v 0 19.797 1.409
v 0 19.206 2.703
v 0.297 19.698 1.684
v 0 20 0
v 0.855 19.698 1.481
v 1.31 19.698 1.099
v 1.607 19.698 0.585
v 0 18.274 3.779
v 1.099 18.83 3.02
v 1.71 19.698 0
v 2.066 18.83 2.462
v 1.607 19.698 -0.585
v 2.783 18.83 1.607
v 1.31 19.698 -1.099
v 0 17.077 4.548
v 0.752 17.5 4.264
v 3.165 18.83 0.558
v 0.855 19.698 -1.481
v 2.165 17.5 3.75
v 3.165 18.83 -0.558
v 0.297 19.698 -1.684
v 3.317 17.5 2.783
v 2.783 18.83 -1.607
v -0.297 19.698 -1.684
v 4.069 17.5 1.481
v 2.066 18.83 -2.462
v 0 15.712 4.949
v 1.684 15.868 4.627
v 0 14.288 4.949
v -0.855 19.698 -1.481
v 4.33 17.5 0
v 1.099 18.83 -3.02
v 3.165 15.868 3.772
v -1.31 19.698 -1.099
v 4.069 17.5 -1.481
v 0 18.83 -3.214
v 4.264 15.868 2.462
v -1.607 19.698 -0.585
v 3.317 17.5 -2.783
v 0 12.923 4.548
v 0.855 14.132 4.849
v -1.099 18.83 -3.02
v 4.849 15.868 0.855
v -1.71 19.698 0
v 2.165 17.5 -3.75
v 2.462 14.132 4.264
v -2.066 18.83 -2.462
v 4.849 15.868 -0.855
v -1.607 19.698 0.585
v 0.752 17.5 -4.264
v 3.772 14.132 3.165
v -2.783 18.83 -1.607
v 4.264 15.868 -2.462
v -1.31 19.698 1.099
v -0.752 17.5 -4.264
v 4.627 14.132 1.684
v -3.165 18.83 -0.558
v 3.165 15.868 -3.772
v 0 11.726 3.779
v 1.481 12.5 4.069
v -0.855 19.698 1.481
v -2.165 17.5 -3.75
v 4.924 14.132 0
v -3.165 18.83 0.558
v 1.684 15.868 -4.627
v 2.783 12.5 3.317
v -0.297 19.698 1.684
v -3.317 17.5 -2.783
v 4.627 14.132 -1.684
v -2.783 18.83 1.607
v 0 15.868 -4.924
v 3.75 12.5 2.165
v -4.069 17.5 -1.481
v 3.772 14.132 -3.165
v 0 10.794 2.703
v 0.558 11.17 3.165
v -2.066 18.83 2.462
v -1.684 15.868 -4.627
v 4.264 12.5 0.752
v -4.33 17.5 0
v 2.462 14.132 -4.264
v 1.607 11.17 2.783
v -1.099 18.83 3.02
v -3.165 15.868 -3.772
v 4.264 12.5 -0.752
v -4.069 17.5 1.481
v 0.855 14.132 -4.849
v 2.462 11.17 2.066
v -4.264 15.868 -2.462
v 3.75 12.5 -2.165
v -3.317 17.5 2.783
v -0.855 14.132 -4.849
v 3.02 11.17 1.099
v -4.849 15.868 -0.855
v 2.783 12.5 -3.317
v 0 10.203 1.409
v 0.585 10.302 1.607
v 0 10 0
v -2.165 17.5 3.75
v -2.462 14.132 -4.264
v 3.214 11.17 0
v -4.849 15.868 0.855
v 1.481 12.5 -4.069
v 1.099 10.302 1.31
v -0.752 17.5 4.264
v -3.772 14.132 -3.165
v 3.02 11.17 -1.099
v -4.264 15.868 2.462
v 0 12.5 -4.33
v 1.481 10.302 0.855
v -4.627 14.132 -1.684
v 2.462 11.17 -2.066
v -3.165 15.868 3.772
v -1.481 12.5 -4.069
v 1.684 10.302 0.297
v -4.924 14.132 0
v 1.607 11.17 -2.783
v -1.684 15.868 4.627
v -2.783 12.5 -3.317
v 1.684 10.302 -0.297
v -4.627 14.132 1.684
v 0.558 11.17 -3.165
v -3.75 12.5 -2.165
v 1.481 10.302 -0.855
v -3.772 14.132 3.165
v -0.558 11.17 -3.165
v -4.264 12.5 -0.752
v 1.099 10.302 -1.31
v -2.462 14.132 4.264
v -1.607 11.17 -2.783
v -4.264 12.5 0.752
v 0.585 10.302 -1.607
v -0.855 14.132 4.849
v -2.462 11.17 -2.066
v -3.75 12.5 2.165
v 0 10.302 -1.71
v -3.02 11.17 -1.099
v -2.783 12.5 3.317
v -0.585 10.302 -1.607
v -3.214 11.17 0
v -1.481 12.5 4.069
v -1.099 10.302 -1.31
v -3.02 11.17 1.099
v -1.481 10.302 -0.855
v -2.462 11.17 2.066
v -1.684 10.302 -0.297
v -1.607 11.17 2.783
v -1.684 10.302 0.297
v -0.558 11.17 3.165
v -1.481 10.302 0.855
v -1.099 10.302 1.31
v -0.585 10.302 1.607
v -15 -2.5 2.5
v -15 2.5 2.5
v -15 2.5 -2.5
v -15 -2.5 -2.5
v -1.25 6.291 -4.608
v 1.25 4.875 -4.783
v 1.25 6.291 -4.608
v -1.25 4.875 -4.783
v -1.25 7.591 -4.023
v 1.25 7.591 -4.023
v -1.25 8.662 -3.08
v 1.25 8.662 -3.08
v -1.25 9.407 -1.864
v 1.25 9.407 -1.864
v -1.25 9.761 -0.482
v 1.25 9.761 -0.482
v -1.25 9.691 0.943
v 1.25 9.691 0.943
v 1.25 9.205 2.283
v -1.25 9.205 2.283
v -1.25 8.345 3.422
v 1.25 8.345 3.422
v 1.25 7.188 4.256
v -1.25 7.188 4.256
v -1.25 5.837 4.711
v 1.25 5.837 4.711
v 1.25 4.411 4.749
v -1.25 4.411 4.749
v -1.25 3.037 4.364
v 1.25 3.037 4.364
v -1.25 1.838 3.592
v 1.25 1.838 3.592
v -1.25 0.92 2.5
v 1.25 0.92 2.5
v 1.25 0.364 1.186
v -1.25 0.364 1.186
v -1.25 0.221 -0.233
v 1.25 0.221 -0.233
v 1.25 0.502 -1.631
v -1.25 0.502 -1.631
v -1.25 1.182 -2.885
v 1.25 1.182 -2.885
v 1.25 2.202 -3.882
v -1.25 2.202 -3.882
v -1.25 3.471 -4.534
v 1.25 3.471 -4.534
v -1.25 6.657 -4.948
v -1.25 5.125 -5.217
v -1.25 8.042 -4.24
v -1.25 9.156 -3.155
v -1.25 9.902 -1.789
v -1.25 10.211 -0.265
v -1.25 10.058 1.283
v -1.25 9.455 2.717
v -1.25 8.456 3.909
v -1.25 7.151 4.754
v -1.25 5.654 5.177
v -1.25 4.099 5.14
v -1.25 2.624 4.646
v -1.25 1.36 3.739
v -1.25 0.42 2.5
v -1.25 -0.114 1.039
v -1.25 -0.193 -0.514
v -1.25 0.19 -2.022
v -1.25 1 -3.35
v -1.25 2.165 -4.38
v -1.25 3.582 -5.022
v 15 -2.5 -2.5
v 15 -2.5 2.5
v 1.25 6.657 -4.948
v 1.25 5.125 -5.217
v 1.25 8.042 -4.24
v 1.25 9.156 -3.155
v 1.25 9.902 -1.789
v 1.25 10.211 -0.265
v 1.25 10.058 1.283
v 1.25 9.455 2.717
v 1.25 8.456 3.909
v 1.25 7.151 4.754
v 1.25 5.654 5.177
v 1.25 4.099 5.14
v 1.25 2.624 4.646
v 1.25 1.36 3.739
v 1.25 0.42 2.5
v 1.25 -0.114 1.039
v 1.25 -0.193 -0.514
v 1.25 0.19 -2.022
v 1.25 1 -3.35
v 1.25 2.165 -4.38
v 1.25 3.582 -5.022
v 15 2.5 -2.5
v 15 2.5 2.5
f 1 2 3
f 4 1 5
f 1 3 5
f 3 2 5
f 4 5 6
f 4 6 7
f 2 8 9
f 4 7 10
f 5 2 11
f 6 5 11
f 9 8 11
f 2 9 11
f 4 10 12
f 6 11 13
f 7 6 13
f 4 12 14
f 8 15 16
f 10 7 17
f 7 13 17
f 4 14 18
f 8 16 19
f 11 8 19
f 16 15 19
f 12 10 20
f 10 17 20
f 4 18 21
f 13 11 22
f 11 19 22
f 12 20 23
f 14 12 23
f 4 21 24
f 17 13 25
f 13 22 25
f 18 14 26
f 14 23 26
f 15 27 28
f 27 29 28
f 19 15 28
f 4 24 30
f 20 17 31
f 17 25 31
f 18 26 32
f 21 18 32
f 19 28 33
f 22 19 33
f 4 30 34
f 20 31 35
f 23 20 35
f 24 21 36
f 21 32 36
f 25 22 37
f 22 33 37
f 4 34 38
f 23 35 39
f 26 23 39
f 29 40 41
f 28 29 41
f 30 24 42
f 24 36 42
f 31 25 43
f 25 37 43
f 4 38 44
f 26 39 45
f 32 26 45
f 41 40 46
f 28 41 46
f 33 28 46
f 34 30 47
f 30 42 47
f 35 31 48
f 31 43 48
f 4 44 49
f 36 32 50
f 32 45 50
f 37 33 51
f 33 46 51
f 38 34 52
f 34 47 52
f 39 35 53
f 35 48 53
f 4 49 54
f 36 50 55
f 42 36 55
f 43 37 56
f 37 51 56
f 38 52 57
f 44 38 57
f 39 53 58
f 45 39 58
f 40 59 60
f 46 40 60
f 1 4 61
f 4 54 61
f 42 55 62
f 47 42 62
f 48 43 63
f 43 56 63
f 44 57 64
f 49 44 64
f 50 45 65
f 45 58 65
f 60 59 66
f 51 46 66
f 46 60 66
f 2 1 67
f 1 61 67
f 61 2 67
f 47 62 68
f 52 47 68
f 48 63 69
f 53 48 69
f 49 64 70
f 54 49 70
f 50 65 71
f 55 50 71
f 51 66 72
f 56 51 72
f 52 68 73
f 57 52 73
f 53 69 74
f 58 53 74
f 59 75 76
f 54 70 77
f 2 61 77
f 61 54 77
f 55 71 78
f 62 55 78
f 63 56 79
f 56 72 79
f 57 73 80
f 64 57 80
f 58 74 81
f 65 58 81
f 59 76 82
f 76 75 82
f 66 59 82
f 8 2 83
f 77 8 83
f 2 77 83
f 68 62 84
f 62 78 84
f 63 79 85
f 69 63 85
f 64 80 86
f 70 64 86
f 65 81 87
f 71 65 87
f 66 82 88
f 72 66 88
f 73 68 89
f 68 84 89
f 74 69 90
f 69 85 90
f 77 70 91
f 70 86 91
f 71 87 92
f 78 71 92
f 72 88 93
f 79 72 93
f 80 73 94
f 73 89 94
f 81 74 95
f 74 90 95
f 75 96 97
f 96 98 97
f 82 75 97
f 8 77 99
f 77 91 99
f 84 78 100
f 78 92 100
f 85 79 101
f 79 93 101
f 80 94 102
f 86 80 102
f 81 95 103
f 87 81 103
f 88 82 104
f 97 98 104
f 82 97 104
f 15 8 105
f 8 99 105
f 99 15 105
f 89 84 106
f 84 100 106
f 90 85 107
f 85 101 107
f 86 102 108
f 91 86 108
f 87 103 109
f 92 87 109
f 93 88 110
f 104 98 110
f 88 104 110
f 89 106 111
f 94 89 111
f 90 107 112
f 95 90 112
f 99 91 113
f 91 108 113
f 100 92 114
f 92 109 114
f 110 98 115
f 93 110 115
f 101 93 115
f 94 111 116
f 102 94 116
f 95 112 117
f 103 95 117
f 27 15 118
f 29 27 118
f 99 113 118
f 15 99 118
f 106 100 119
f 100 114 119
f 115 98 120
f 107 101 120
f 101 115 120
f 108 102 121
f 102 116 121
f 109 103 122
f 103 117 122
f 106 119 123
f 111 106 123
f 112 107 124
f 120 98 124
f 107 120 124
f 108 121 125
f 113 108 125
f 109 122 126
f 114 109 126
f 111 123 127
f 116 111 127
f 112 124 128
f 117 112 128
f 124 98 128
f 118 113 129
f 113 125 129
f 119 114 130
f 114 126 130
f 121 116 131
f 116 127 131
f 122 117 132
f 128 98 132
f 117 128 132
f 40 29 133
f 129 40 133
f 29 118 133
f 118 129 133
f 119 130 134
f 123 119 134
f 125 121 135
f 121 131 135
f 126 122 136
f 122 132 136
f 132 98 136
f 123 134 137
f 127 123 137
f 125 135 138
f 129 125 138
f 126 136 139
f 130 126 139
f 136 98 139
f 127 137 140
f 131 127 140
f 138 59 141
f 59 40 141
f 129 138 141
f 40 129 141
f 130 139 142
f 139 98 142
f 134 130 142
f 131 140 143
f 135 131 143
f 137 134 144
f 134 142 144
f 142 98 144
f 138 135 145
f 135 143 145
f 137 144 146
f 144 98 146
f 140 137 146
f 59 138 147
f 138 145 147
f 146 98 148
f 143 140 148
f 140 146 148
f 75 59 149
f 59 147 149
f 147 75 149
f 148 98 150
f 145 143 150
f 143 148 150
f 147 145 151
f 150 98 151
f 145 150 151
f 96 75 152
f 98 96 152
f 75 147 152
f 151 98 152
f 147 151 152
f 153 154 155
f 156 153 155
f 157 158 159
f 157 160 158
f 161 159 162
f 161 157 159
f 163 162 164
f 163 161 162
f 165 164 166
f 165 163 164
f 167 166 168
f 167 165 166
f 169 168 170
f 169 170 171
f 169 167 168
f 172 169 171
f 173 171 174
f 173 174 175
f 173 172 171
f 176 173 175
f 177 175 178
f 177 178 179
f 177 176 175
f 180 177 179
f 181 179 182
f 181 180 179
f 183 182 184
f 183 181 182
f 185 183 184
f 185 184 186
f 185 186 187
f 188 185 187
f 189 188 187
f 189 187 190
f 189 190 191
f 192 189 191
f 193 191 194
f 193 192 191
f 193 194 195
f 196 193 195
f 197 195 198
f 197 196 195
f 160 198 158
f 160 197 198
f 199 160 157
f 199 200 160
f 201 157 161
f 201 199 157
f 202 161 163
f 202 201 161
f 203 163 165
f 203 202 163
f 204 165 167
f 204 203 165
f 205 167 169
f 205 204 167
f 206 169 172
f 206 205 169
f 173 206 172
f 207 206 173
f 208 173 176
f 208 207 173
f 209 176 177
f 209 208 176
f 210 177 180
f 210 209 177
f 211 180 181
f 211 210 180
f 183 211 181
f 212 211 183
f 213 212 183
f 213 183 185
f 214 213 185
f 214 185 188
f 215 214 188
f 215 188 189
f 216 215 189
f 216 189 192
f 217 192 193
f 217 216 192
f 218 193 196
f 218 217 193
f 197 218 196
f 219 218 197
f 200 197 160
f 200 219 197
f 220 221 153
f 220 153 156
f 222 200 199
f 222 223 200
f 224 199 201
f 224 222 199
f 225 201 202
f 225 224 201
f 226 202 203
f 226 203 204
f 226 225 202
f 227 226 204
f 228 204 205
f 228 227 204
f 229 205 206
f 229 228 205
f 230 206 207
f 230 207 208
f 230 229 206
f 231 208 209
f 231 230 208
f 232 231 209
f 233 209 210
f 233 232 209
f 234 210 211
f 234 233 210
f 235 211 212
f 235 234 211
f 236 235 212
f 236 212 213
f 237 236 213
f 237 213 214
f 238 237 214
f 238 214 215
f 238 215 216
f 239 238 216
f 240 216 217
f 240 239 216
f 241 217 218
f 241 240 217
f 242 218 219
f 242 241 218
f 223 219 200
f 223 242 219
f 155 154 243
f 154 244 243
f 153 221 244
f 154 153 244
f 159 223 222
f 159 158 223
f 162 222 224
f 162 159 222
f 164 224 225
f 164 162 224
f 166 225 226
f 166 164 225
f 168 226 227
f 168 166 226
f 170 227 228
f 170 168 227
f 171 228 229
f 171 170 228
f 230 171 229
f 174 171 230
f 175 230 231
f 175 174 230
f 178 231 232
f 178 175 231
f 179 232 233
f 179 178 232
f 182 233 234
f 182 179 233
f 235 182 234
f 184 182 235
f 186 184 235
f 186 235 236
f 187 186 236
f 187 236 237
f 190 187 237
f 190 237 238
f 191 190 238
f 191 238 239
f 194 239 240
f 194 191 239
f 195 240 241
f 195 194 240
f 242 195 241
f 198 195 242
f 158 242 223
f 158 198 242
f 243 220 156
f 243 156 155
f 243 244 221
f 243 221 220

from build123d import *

# Parameters (mm, degrees)
SKETCH1_W           = 5
SKETCH1_H           = 5
BOSS_EXTRUDE1_DEPTH = 15
SKETCH5_W           = 2.5
SKETCH5_H           = 0.5


with BuildPart() as part:
    # Sketch1 → Boss-Extrude1 (new, symmetric)
    with BuildSketch(Plane(origin=(0, 0, 0), x_dir=(0, 0, -1), z_dir=(1, 0, 0))):
        Rectangle(SKETCH1_W, SKETCH1_H)
    extrude(amount=BOSS_EXTRUDE1_DEPTH, both=True)


with BuildPart() as body_2:
    # Sketch3 → Revolve1 (revolve)
    with BuildSketch(Plane(origin=(0, 0, 0), x_dir=(0, 0, -1), z_dir=(1, 0, 0))):
        with BuildLine():
            Line((0, 10), (0, 20))
            ThreePointArc((0, 20), (-5, 15), (0, 10))
        make_face()
    revolve(axis=Axis((0, 10, 0), (0, 1, 0)))


with BuildPart() as body_3:
    # Sweep1: sweep along a path in Sketch4
    with BuildLine(Plane(origin=(0, 0, 0), x_dir=(0, 0, -1), z_dir=(1, 0, 0))) as sweep1_path:
        CenterArc((0, 5), 5, 0, 360)
    # Sketch5 → Sweep1 (sweep)
    with BuildSketch(Plane.XY.offset(2.5)):
        with Locations((0, 0.669872981)):
            Rectangle(SKETCH5_W, SKETCH5_H)
    sweep(path=sweep1_path.line)


solid = Compound([part.part, body_2.part, body_3.part])
